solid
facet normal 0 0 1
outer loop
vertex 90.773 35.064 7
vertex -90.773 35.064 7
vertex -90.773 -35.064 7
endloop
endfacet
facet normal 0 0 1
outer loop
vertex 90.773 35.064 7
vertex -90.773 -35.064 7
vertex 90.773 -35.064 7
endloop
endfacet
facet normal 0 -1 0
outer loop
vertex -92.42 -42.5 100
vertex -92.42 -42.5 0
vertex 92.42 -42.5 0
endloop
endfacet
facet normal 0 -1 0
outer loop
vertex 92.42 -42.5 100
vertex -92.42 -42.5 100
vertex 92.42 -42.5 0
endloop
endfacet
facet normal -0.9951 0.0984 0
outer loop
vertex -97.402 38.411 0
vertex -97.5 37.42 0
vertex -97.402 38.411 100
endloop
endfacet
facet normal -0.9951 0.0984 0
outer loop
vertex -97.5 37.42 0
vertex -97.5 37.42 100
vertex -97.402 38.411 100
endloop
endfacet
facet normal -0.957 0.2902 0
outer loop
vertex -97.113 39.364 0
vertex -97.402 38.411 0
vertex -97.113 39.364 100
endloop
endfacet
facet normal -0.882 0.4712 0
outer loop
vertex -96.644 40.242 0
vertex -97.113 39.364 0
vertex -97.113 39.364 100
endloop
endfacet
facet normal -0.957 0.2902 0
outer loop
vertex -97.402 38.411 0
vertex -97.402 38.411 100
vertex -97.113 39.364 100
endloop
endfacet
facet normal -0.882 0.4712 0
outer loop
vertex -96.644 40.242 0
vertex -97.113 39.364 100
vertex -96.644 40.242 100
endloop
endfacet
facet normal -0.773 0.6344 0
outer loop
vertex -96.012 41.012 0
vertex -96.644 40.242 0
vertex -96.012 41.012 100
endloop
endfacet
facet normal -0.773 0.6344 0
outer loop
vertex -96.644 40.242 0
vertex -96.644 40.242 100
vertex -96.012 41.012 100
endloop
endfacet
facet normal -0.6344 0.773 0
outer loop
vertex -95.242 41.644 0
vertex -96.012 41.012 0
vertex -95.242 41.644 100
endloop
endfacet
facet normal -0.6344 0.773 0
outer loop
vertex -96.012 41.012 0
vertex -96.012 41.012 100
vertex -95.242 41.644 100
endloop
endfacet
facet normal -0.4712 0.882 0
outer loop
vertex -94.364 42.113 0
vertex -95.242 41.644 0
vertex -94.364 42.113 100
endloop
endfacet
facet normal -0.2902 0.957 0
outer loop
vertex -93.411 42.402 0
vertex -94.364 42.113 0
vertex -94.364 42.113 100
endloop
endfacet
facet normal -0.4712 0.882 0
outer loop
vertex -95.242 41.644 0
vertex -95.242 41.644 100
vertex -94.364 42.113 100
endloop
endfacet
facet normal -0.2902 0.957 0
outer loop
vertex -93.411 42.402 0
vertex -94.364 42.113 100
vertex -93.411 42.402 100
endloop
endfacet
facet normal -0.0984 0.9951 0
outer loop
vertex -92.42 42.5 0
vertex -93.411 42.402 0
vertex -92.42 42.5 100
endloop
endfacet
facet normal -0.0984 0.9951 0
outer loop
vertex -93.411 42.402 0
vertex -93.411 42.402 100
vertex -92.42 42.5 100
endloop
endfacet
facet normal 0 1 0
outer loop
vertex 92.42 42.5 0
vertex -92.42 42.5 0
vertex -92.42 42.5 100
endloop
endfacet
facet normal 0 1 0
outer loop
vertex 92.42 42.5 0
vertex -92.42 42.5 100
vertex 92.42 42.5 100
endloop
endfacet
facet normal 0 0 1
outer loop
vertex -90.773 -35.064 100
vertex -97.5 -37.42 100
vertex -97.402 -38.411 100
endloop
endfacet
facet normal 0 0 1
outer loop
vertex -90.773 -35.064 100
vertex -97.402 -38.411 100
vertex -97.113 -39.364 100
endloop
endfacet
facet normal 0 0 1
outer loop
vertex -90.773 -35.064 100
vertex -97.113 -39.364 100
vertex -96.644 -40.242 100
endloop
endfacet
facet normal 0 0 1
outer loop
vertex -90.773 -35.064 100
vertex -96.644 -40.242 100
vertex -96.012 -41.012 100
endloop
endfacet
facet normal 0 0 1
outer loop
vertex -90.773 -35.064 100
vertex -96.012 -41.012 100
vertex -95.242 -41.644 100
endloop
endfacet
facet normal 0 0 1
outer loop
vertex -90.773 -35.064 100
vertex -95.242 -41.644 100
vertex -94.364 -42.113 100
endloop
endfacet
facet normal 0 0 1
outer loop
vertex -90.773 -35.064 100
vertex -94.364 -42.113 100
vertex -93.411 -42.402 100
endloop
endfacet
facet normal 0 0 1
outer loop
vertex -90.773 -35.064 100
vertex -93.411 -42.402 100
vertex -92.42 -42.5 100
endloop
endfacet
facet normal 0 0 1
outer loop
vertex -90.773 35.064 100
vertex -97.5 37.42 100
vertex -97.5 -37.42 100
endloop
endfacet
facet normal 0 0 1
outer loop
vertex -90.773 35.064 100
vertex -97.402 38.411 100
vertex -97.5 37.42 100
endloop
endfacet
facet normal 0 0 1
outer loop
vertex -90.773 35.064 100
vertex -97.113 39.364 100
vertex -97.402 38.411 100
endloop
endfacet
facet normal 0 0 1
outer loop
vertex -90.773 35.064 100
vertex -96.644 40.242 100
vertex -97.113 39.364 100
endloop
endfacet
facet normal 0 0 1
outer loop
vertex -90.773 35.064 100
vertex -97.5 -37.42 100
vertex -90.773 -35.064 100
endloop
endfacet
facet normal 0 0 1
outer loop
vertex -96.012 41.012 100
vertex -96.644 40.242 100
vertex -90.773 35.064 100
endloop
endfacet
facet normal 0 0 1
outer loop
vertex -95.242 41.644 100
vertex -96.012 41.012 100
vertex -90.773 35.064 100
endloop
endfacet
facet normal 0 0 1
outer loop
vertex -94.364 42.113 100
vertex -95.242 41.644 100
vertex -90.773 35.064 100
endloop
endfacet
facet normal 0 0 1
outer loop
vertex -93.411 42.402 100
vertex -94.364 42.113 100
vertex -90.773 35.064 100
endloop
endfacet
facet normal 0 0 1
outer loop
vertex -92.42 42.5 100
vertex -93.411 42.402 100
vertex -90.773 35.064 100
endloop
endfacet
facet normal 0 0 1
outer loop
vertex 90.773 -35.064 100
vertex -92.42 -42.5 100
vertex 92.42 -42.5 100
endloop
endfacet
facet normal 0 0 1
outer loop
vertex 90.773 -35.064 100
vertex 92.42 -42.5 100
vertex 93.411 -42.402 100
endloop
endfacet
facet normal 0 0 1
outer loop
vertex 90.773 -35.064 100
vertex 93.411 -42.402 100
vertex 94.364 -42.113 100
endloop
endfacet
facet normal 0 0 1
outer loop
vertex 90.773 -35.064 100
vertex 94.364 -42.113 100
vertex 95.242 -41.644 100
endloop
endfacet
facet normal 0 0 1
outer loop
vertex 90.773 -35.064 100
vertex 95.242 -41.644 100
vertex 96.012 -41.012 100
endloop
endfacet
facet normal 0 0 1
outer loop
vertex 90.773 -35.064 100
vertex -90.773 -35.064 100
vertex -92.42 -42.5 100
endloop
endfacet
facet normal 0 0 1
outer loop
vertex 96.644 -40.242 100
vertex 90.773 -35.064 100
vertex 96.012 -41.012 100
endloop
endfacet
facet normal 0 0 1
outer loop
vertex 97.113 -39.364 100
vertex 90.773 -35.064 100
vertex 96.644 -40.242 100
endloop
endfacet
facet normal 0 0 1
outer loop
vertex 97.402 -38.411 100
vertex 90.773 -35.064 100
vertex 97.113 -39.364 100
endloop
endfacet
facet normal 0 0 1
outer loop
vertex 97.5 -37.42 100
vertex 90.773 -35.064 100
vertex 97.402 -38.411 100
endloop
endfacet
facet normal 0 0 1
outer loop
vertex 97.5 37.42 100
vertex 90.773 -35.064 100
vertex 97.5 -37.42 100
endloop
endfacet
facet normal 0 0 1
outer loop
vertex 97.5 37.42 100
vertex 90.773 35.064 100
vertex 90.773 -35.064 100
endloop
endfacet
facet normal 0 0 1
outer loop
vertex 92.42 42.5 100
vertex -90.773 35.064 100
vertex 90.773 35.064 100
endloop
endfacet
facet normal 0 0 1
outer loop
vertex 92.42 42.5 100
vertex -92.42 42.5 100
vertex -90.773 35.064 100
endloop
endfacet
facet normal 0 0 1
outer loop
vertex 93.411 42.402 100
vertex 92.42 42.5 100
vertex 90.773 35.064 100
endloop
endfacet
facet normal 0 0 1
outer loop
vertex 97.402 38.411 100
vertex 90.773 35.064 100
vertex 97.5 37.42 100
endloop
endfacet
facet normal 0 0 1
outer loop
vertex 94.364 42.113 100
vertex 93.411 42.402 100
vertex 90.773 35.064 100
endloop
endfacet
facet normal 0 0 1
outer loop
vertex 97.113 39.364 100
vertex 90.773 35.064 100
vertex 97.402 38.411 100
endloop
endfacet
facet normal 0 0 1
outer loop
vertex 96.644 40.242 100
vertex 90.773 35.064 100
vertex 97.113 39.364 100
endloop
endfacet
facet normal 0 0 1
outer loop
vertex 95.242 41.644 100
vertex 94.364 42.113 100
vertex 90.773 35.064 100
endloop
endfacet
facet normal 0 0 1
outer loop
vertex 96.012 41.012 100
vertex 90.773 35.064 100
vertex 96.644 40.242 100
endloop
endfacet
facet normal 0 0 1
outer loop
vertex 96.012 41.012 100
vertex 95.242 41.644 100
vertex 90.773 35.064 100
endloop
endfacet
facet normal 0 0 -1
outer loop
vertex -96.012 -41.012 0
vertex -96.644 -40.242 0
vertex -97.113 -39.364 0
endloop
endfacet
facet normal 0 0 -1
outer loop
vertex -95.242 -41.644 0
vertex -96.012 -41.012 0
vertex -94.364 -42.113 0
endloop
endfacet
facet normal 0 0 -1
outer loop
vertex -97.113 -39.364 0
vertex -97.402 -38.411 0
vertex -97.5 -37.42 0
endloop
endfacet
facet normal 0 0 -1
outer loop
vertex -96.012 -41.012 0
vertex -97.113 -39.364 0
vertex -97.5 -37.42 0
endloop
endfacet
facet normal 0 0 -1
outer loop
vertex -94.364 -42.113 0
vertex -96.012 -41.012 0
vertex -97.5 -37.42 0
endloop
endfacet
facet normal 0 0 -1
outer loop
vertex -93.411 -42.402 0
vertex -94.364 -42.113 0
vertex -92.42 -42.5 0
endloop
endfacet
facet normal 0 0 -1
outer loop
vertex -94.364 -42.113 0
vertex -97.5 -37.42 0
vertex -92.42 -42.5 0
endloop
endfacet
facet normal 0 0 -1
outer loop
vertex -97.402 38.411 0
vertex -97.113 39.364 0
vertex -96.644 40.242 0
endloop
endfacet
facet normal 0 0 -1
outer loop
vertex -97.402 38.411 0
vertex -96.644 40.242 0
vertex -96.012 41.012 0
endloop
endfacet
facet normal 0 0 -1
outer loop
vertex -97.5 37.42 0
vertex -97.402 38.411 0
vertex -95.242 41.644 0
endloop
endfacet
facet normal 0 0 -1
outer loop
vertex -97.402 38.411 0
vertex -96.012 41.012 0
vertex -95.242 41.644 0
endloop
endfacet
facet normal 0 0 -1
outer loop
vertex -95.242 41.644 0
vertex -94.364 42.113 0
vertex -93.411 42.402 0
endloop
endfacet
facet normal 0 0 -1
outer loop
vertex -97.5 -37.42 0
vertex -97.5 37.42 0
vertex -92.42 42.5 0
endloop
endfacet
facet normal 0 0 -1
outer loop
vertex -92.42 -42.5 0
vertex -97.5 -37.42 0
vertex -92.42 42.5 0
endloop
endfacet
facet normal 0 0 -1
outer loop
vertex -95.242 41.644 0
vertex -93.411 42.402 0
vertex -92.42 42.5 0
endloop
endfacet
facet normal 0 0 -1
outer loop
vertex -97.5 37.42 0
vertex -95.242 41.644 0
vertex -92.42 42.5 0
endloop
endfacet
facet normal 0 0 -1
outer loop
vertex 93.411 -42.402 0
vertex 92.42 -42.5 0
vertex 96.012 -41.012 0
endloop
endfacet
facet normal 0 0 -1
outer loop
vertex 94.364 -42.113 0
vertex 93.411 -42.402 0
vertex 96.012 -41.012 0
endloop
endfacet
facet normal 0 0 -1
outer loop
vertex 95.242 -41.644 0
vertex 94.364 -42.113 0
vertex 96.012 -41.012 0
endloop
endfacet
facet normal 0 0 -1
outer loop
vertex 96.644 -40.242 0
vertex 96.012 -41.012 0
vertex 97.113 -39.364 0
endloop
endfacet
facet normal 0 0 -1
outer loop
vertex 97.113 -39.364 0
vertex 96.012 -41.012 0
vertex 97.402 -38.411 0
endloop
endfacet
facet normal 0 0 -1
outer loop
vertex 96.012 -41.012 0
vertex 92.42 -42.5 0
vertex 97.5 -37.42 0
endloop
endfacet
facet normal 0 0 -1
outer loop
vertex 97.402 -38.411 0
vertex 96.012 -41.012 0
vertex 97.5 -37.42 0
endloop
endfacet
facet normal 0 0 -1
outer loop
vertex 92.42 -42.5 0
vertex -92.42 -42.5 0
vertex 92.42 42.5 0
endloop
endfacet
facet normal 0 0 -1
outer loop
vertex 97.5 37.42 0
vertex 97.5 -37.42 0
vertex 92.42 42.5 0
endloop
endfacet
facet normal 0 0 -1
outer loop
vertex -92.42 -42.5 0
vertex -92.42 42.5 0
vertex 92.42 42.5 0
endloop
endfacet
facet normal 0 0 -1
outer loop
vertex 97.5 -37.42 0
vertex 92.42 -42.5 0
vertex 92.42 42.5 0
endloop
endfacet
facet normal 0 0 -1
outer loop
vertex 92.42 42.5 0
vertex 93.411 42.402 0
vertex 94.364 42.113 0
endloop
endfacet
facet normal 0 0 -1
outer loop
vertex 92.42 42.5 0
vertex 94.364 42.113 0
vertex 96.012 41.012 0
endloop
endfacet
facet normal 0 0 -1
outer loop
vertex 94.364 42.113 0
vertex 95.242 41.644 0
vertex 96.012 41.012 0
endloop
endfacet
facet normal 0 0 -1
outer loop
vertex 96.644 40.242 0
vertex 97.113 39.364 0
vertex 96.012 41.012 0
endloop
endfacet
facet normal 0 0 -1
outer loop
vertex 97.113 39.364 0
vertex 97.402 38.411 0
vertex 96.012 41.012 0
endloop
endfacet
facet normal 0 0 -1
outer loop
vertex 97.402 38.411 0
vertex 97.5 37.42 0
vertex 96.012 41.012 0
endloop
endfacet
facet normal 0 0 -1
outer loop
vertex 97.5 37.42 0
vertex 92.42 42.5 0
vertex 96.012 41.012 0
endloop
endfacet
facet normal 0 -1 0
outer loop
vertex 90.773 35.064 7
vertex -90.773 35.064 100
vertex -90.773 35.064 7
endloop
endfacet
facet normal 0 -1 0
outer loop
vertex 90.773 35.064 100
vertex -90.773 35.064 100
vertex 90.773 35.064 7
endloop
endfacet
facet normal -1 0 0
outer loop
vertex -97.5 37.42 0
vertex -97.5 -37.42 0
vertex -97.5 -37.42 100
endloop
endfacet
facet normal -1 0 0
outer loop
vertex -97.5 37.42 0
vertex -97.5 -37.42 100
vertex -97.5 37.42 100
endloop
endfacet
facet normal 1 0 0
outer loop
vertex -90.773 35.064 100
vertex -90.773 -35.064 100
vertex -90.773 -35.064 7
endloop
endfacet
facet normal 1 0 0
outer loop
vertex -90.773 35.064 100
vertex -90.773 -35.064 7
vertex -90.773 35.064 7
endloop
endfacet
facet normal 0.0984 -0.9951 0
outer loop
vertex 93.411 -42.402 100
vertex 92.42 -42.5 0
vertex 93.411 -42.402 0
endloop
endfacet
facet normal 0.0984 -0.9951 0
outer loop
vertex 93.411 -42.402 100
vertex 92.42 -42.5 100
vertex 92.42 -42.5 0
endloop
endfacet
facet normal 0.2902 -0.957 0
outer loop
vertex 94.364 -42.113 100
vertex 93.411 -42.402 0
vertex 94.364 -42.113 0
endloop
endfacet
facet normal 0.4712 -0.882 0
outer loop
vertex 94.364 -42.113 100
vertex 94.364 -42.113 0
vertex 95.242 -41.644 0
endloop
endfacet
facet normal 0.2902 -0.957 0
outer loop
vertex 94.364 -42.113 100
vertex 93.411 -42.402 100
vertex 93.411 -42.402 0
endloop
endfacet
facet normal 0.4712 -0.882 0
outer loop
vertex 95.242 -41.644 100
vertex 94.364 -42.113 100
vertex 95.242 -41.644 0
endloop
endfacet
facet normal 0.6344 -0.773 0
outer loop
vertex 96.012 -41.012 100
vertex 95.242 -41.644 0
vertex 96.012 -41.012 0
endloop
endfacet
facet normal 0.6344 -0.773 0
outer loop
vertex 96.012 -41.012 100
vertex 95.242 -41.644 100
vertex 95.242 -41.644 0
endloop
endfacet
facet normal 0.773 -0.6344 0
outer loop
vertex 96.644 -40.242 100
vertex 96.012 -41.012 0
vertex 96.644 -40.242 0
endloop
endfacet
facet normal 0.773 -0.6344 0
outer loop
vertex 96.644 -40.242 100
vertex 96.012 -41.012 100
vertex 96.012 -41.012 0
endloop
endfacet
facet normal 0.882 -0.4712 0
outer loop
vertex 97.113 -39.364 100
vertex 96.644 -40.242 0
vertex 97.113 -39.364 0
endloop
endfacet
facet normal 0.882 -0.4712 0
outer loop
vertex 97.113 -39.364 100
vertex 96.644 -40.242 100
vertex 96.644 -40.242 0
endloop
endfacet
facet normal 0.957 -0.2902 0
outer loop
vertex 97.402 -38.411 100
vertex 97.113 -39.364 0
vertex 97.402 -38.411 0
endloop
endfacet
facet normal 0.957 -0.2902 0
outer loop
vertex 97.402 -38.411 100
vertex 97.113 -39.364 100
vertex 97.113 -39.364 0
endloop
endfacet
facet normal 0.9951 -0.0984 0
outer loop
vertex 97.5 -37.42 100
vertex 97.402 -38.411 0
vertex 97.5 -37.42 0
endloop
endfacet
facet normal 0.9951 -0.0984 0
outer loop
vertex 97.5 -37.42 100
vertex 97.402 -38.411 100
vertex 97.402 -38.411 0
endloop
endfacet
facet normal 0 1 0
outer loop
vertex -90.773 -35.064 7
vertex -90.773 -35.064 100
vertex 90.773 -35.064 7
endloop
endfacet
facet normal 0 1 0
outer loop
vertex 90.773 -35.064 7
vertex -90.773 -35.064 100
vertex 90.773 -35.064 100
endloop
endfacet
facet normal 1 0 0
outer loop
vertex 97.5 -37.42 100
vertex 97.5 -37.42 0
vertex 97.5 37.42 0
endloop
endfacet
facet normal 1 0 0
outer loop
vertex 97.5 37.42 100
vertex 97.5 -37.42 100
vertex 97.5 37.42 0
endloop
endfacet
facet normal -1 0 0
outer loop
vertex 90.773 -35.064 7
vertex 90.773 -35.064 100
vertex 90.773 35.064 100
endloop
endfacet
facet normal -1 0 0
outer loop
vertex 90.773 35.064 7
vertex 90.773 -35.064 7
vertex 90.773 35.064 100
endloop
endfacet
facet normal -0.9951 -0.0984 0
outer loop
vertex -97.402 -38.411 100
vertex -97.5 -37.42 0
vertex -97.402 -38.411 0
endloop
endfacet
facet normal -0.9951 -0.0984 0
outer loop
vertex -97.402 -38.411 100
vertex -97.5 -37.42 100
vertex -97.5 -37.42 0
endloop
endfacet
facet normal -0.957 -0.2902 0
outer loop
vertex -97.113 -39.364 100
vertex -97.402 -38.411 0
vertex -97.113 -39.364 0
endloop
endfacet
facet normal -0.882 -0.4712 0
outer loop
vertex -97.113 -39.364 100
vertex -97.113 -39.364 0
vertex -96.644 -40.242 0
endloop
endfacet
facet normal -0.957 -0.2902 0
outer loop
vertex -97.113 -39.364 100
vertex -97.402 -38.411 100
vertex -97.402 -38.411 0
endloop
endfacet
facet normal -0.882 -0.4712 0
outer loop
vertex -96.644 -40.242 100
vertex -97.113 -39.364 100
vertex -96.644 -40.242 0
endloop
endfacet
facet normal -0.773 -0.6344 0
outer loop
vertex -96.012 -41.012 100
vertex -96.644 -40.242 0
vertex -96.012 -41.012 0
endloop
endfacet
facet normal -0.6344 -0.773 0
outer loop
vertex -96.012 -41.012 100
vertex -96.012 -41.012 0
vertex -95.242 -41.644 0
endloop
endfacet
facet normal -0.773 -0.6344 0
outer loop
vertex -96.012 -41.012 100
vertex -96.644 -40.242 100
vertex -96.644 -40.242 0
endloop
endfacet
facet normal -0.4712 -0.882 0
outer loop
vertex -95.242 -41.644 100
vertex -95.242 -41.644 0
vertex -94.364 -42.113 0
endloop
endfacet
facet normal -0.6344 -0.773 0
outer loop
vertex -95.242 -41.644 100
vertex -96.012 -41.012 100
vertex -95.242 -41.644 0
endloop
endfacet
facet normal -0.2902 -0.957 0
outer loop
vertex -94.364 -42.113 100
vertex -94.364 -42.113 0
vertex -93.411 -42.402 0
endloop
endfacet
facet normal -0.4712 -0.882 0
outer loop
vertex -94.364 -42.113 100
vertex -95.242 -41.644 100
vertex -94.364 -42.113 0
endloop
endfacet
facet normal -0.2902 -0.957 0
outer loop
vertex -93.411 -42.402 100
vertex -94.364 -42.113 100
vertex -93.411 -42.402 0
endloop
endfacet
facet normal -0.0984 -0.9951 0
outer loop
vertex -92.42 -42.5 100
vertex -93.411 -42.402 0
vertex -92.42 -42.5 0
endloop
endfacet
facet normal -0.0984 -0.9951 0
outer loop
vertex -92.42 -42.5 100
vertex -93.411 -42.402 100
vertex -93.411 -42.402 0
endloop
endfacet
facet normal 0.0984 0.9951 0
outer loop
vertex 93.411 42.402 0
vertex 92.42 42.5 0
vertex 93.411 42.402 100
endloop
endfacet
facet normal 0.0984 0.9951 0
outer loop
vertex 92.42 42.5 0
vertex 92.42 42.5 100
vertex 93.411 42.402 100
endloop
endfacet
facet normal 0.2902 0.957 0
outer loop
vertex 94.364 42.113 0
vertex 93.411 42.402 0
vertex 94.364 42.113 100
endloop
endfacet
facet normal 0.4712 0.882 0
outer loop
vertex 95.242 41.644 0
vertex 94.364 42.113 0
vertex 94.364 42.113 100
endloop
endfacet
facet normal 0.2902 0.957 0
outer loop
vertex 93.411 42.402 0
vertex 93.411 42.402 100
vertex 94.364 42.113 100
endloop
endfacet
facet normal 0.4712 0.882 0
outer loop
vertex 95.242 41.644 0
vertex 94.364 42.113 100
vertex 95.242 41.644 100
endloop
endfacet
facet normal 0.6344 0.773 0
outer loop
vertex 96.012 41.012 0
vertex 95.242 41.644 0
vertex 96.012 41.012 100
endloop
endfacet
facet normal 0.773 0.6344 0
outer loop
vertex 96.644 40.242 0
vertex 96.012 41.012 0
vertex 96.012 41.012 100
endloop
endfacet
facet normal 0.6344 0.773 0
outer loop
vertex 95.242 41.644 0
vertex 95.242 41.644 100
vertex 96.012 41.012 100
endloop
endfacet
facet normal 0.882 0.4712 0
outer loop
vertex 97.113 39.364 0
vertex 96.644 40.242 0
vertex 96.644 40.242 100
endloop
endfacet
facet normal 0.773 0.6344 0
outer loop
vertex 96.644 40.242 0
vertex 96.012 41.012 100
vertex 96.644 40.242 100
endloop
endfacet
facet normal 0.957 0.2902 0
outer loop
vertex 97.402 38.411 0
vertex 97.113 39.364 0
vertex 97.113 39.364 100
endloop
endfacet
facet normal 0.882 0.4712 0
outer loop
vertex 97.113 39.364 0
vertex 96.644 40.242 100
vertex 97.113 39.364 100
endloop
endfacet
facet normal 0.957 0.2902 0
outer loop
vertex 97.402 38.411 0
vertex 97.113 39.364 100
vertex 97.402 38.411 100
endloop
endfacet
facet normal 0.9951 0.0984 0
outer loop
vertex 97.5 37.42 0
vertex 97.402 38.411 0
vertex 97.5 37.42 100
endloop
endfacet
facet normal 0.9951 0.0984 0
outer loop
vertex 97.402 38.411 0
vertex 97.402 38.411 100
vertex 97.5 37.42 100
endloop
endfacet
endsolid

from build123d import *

# Parameters (mm, degrees)
F0_W     = 195
F0_H     = 85
F1_DEPTH = 100
F2_W     = 181.545526
F2_H     = 70.127204
F3_DEPTH = 93
F4_R     = 5.08


with BuildPart() as f1:
    # F0 (on Top) → F1 (new body)
    with BuildSketch(Plane.XY):
        Rectangle(F0_W, F0_H)
    extrude(amount=F1_DEPTH)

    # F2 (on face) → F3 (cut)
    with BuildSketch(Plane.XY.offset(100)):
        Rectangle(F2_W, F2_H)
    extrude(amount=-F3_DEPTH, mode=Mode.SUBTRACT)

    # F4
    f4_edges = [f1.edges().sort_by_distance(p)[0] for p in [
        (97.5, -42.5, 50),
        (97.5, 42.5, 50),
        (-97.5, -42.5, 50),
        (-97.5, 42.5, 50),
    ]]
    fillet(f4_edges, radius=F4_R)


solid = f1.part
